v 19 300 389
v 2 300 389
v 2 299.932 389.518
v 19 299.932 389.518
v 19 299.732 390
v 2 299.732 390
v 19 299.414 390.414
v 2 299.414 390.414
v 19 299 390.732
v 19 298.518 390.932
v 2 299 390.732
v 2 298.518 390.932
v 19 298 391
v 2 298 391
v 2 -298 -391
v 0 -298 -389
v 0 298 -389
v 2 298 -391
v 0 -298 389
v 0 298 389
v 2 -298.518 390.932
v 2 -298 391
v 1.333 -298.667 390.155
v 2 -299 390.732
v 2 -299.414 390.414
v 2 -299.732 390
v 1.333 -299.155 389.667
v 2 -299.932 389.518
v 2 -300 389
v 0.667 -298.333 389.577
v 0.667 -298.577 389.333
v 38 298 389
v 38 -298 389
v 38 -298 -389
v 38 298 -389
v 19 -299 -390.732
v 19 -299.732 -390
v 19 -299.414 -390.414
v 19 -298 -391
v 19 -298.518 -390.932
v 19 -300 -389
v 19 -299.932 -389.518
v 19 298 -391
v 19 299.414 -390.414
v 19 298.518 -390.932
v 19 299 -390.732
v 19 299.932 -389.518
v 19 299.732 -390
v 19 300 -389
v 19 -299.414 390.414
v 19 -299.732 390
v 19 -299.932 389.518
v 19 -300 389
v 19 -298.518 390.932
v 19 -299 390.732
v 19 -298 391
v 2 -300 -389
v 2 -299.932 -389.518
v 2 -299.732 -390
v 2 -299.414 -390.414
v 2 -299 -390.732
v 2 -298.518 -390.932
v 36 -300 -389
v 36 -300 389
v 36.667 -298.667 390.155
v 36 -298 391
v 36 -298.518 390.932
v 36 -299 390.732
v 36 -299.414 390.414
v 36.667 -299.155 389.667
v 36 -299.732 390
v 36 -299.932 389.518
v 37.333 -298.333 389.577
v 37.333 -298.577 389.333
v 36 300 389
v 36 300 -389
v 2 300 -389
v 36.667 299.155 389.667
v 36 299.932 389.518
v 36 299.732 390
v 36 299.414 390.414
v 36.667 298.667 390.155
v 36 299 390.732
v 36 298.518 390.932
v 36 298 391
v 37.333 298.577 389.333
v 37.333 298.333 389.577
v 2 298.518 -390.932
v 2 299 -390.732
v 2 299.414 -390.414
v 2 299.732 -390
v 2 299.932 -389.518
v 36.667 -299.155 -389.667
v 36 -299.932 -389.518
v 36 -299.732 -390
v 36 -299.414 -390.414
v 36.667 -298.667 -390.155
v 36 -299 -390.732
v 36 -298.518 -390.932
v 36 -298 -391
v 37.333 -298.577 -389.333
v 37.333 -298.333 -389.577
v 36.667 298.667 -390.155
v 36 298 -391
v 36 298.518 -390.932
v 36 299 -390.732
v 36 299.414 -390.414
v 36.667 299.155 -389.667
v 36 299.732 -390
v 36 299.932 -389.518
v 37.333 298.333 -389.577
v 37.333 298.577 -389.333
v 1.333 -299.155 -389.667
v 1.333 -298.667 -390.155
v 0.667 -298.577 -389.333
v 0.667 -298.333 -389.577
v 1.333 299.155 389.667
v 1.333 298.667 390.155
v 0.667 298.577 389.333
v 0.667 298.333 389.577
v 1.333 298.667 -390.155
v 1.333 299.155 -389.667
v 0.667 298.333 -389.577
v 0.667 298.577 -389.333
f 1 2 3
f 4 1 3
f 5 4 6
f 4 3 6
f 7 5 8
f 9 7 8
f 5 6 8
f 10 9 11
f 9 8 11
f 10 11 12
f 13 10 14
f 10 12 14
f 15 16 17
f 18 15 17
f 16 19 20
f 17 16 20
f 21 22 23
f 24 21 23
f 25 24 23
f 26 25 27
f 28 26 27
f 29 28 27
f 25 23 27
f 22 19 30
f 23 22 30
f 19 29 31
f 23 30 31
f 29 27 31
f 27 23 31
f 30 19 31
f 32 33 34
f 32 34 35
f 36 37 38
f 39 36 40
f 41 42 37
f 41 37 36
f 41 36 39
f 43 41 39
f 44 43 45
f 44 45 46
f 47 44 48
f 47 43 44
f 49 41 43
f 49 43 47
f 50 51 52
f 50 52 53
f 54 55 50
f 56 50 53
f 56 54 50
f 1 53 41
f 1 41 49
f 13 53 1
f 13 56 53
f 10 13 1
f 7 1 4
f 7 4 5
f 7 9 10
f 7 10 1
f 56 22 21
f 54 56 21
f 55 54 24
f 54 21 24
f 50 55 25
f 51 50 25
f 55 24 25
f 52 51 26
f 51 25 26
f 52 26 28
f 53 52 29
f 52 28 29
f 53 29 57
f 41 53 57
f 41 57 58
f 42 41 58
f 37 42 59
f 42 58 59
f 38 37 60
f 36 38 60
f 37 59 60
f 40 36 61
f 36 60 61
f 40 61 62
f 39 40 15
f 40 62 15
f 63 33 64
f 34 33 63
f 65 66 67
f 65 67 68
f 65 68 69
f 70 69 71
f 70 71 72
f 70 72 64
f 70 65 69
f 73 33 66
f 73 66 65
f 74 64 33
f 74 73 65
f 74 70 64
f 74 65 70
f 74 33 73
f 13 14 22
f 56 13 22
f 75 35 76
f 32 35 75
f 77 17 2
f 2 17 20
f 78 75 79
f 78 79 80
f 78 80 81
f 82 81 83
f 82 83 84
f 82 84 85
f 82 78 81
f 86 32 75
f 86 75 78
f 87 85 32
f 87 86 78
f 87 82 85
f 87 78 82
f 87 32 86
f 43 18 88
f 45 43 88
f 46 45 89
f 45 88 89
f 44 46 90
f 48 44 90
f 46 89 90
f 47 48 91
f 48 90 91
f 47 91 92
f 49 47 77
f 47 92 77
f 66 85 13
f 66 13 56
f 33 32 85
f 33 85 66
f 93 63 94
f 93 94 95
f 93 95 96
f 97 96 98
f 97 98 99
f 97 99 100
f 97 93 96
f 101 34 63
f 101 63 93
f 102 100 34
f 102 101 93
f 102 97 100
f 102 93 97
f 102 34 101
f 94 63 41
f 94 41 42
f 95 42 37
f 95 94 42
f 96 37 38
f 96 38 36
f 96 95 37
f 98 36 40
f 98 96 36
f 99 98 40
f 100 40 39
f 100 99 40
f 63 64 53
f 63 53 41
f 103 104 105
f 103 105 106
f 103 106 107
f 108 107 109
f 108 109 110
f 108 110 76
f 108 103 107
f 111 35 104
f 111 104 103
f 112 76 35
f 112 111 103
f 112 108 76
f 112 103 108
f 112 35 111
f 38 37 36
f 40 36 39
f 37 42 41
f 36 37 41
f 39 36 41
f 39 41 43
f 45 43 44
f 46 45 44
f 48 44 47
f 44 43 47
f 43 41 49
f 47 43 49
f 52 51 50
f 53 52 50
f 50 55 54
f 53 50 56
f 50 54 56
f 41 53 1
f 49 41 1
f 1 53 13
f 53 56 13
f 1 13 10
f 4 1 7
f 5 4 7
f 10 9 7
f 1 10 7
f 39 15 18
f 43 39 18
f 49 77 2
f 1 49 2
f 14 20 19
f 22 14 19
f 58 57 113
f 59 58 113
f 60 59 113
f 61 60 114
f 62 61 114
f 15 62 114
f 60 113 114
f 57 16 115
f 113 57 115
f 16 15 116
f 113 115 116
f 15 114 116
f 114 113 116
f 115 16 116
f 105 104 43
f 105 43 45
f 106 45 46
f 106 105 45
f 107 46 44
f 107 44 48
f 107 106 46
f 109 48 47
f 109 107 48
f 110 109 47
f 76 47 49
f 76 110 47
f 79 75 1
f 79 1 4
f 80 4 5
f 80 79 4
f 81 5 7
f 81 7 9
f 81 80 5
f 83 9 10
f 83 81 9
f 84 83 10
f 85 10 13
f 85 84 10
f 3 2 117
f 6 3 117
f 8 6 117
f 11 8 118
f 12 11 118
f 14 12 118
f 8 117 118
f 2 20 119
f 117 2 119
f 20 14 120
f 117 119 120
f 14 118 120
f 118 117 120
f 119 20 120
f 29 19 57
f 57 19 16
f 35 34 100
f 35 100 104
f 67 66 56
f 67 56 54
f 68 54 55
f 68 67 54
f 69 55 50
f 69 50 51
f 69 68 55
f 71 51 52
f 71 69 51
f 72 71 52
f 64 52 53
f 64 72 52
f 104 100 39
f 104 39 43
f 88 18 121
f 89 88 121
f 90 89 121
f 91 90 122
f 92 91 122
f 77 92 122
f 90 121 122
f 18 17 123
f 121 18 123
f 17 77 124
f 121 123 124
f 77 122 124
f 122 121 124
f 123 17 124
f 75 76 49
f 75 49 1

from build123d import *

# Parameters (mm, degrees)
F1_DEPTH = 19
F2_SIZE2 = 1.99999
F2_SIZE  = 1.99999


# Not quite as in the source:
# - a fillet or chamfer is up to 0.001 mm smaller than in the source, because OpenCascade refuses the exact size


with BuildPart() as f1:
    # F0 (on Right) → F1 (new body)
    with BuildSketch(Plane.YZ):
        with BuildLine():
            Line((298, 391), (-298, 391))
            ThreePointArc((-298, 391), (-299.4142135624, 390.4142135624), (-300, 389))
            Line((-300, 389), (-300, -389))
            ThreePointArc((-300, -389), (-299.4142135624, -390.4142135624), (-298, -391))
            Line((-298, -391), (298, -391))
            ThreePointArc((298, -391), (299.4142135624, -390.4142135624), (300, -389))
            Line((300, -389), (300, 389))
            ThreePointArc((300, 389), (299.4142135624, 390.4142135624), (298, 391))
        make_face()
    extrude(amount=F1_DEPTH)

    # F2 (size 2 and 2 in the source; OpenCascade refuses exactly that, so slightly less here)
    f2_edges = [f1.edges().sort_by_distance(p)[0] for p in [
        (0, 0, 391),
        (0, -300, 0),
        (0, 0, -391),
        (0, 300, 0),
    ]]
    chamfer(f2_edges, length=F2_SIZE, length2=F2_SIZE2)


with BuildPart() as f3_1:
    # F3: instance of F1
    add(f1.part.mirror(Plane.YZ.offset(19)))


solid = Compound([f1.part, f3_1.part])
